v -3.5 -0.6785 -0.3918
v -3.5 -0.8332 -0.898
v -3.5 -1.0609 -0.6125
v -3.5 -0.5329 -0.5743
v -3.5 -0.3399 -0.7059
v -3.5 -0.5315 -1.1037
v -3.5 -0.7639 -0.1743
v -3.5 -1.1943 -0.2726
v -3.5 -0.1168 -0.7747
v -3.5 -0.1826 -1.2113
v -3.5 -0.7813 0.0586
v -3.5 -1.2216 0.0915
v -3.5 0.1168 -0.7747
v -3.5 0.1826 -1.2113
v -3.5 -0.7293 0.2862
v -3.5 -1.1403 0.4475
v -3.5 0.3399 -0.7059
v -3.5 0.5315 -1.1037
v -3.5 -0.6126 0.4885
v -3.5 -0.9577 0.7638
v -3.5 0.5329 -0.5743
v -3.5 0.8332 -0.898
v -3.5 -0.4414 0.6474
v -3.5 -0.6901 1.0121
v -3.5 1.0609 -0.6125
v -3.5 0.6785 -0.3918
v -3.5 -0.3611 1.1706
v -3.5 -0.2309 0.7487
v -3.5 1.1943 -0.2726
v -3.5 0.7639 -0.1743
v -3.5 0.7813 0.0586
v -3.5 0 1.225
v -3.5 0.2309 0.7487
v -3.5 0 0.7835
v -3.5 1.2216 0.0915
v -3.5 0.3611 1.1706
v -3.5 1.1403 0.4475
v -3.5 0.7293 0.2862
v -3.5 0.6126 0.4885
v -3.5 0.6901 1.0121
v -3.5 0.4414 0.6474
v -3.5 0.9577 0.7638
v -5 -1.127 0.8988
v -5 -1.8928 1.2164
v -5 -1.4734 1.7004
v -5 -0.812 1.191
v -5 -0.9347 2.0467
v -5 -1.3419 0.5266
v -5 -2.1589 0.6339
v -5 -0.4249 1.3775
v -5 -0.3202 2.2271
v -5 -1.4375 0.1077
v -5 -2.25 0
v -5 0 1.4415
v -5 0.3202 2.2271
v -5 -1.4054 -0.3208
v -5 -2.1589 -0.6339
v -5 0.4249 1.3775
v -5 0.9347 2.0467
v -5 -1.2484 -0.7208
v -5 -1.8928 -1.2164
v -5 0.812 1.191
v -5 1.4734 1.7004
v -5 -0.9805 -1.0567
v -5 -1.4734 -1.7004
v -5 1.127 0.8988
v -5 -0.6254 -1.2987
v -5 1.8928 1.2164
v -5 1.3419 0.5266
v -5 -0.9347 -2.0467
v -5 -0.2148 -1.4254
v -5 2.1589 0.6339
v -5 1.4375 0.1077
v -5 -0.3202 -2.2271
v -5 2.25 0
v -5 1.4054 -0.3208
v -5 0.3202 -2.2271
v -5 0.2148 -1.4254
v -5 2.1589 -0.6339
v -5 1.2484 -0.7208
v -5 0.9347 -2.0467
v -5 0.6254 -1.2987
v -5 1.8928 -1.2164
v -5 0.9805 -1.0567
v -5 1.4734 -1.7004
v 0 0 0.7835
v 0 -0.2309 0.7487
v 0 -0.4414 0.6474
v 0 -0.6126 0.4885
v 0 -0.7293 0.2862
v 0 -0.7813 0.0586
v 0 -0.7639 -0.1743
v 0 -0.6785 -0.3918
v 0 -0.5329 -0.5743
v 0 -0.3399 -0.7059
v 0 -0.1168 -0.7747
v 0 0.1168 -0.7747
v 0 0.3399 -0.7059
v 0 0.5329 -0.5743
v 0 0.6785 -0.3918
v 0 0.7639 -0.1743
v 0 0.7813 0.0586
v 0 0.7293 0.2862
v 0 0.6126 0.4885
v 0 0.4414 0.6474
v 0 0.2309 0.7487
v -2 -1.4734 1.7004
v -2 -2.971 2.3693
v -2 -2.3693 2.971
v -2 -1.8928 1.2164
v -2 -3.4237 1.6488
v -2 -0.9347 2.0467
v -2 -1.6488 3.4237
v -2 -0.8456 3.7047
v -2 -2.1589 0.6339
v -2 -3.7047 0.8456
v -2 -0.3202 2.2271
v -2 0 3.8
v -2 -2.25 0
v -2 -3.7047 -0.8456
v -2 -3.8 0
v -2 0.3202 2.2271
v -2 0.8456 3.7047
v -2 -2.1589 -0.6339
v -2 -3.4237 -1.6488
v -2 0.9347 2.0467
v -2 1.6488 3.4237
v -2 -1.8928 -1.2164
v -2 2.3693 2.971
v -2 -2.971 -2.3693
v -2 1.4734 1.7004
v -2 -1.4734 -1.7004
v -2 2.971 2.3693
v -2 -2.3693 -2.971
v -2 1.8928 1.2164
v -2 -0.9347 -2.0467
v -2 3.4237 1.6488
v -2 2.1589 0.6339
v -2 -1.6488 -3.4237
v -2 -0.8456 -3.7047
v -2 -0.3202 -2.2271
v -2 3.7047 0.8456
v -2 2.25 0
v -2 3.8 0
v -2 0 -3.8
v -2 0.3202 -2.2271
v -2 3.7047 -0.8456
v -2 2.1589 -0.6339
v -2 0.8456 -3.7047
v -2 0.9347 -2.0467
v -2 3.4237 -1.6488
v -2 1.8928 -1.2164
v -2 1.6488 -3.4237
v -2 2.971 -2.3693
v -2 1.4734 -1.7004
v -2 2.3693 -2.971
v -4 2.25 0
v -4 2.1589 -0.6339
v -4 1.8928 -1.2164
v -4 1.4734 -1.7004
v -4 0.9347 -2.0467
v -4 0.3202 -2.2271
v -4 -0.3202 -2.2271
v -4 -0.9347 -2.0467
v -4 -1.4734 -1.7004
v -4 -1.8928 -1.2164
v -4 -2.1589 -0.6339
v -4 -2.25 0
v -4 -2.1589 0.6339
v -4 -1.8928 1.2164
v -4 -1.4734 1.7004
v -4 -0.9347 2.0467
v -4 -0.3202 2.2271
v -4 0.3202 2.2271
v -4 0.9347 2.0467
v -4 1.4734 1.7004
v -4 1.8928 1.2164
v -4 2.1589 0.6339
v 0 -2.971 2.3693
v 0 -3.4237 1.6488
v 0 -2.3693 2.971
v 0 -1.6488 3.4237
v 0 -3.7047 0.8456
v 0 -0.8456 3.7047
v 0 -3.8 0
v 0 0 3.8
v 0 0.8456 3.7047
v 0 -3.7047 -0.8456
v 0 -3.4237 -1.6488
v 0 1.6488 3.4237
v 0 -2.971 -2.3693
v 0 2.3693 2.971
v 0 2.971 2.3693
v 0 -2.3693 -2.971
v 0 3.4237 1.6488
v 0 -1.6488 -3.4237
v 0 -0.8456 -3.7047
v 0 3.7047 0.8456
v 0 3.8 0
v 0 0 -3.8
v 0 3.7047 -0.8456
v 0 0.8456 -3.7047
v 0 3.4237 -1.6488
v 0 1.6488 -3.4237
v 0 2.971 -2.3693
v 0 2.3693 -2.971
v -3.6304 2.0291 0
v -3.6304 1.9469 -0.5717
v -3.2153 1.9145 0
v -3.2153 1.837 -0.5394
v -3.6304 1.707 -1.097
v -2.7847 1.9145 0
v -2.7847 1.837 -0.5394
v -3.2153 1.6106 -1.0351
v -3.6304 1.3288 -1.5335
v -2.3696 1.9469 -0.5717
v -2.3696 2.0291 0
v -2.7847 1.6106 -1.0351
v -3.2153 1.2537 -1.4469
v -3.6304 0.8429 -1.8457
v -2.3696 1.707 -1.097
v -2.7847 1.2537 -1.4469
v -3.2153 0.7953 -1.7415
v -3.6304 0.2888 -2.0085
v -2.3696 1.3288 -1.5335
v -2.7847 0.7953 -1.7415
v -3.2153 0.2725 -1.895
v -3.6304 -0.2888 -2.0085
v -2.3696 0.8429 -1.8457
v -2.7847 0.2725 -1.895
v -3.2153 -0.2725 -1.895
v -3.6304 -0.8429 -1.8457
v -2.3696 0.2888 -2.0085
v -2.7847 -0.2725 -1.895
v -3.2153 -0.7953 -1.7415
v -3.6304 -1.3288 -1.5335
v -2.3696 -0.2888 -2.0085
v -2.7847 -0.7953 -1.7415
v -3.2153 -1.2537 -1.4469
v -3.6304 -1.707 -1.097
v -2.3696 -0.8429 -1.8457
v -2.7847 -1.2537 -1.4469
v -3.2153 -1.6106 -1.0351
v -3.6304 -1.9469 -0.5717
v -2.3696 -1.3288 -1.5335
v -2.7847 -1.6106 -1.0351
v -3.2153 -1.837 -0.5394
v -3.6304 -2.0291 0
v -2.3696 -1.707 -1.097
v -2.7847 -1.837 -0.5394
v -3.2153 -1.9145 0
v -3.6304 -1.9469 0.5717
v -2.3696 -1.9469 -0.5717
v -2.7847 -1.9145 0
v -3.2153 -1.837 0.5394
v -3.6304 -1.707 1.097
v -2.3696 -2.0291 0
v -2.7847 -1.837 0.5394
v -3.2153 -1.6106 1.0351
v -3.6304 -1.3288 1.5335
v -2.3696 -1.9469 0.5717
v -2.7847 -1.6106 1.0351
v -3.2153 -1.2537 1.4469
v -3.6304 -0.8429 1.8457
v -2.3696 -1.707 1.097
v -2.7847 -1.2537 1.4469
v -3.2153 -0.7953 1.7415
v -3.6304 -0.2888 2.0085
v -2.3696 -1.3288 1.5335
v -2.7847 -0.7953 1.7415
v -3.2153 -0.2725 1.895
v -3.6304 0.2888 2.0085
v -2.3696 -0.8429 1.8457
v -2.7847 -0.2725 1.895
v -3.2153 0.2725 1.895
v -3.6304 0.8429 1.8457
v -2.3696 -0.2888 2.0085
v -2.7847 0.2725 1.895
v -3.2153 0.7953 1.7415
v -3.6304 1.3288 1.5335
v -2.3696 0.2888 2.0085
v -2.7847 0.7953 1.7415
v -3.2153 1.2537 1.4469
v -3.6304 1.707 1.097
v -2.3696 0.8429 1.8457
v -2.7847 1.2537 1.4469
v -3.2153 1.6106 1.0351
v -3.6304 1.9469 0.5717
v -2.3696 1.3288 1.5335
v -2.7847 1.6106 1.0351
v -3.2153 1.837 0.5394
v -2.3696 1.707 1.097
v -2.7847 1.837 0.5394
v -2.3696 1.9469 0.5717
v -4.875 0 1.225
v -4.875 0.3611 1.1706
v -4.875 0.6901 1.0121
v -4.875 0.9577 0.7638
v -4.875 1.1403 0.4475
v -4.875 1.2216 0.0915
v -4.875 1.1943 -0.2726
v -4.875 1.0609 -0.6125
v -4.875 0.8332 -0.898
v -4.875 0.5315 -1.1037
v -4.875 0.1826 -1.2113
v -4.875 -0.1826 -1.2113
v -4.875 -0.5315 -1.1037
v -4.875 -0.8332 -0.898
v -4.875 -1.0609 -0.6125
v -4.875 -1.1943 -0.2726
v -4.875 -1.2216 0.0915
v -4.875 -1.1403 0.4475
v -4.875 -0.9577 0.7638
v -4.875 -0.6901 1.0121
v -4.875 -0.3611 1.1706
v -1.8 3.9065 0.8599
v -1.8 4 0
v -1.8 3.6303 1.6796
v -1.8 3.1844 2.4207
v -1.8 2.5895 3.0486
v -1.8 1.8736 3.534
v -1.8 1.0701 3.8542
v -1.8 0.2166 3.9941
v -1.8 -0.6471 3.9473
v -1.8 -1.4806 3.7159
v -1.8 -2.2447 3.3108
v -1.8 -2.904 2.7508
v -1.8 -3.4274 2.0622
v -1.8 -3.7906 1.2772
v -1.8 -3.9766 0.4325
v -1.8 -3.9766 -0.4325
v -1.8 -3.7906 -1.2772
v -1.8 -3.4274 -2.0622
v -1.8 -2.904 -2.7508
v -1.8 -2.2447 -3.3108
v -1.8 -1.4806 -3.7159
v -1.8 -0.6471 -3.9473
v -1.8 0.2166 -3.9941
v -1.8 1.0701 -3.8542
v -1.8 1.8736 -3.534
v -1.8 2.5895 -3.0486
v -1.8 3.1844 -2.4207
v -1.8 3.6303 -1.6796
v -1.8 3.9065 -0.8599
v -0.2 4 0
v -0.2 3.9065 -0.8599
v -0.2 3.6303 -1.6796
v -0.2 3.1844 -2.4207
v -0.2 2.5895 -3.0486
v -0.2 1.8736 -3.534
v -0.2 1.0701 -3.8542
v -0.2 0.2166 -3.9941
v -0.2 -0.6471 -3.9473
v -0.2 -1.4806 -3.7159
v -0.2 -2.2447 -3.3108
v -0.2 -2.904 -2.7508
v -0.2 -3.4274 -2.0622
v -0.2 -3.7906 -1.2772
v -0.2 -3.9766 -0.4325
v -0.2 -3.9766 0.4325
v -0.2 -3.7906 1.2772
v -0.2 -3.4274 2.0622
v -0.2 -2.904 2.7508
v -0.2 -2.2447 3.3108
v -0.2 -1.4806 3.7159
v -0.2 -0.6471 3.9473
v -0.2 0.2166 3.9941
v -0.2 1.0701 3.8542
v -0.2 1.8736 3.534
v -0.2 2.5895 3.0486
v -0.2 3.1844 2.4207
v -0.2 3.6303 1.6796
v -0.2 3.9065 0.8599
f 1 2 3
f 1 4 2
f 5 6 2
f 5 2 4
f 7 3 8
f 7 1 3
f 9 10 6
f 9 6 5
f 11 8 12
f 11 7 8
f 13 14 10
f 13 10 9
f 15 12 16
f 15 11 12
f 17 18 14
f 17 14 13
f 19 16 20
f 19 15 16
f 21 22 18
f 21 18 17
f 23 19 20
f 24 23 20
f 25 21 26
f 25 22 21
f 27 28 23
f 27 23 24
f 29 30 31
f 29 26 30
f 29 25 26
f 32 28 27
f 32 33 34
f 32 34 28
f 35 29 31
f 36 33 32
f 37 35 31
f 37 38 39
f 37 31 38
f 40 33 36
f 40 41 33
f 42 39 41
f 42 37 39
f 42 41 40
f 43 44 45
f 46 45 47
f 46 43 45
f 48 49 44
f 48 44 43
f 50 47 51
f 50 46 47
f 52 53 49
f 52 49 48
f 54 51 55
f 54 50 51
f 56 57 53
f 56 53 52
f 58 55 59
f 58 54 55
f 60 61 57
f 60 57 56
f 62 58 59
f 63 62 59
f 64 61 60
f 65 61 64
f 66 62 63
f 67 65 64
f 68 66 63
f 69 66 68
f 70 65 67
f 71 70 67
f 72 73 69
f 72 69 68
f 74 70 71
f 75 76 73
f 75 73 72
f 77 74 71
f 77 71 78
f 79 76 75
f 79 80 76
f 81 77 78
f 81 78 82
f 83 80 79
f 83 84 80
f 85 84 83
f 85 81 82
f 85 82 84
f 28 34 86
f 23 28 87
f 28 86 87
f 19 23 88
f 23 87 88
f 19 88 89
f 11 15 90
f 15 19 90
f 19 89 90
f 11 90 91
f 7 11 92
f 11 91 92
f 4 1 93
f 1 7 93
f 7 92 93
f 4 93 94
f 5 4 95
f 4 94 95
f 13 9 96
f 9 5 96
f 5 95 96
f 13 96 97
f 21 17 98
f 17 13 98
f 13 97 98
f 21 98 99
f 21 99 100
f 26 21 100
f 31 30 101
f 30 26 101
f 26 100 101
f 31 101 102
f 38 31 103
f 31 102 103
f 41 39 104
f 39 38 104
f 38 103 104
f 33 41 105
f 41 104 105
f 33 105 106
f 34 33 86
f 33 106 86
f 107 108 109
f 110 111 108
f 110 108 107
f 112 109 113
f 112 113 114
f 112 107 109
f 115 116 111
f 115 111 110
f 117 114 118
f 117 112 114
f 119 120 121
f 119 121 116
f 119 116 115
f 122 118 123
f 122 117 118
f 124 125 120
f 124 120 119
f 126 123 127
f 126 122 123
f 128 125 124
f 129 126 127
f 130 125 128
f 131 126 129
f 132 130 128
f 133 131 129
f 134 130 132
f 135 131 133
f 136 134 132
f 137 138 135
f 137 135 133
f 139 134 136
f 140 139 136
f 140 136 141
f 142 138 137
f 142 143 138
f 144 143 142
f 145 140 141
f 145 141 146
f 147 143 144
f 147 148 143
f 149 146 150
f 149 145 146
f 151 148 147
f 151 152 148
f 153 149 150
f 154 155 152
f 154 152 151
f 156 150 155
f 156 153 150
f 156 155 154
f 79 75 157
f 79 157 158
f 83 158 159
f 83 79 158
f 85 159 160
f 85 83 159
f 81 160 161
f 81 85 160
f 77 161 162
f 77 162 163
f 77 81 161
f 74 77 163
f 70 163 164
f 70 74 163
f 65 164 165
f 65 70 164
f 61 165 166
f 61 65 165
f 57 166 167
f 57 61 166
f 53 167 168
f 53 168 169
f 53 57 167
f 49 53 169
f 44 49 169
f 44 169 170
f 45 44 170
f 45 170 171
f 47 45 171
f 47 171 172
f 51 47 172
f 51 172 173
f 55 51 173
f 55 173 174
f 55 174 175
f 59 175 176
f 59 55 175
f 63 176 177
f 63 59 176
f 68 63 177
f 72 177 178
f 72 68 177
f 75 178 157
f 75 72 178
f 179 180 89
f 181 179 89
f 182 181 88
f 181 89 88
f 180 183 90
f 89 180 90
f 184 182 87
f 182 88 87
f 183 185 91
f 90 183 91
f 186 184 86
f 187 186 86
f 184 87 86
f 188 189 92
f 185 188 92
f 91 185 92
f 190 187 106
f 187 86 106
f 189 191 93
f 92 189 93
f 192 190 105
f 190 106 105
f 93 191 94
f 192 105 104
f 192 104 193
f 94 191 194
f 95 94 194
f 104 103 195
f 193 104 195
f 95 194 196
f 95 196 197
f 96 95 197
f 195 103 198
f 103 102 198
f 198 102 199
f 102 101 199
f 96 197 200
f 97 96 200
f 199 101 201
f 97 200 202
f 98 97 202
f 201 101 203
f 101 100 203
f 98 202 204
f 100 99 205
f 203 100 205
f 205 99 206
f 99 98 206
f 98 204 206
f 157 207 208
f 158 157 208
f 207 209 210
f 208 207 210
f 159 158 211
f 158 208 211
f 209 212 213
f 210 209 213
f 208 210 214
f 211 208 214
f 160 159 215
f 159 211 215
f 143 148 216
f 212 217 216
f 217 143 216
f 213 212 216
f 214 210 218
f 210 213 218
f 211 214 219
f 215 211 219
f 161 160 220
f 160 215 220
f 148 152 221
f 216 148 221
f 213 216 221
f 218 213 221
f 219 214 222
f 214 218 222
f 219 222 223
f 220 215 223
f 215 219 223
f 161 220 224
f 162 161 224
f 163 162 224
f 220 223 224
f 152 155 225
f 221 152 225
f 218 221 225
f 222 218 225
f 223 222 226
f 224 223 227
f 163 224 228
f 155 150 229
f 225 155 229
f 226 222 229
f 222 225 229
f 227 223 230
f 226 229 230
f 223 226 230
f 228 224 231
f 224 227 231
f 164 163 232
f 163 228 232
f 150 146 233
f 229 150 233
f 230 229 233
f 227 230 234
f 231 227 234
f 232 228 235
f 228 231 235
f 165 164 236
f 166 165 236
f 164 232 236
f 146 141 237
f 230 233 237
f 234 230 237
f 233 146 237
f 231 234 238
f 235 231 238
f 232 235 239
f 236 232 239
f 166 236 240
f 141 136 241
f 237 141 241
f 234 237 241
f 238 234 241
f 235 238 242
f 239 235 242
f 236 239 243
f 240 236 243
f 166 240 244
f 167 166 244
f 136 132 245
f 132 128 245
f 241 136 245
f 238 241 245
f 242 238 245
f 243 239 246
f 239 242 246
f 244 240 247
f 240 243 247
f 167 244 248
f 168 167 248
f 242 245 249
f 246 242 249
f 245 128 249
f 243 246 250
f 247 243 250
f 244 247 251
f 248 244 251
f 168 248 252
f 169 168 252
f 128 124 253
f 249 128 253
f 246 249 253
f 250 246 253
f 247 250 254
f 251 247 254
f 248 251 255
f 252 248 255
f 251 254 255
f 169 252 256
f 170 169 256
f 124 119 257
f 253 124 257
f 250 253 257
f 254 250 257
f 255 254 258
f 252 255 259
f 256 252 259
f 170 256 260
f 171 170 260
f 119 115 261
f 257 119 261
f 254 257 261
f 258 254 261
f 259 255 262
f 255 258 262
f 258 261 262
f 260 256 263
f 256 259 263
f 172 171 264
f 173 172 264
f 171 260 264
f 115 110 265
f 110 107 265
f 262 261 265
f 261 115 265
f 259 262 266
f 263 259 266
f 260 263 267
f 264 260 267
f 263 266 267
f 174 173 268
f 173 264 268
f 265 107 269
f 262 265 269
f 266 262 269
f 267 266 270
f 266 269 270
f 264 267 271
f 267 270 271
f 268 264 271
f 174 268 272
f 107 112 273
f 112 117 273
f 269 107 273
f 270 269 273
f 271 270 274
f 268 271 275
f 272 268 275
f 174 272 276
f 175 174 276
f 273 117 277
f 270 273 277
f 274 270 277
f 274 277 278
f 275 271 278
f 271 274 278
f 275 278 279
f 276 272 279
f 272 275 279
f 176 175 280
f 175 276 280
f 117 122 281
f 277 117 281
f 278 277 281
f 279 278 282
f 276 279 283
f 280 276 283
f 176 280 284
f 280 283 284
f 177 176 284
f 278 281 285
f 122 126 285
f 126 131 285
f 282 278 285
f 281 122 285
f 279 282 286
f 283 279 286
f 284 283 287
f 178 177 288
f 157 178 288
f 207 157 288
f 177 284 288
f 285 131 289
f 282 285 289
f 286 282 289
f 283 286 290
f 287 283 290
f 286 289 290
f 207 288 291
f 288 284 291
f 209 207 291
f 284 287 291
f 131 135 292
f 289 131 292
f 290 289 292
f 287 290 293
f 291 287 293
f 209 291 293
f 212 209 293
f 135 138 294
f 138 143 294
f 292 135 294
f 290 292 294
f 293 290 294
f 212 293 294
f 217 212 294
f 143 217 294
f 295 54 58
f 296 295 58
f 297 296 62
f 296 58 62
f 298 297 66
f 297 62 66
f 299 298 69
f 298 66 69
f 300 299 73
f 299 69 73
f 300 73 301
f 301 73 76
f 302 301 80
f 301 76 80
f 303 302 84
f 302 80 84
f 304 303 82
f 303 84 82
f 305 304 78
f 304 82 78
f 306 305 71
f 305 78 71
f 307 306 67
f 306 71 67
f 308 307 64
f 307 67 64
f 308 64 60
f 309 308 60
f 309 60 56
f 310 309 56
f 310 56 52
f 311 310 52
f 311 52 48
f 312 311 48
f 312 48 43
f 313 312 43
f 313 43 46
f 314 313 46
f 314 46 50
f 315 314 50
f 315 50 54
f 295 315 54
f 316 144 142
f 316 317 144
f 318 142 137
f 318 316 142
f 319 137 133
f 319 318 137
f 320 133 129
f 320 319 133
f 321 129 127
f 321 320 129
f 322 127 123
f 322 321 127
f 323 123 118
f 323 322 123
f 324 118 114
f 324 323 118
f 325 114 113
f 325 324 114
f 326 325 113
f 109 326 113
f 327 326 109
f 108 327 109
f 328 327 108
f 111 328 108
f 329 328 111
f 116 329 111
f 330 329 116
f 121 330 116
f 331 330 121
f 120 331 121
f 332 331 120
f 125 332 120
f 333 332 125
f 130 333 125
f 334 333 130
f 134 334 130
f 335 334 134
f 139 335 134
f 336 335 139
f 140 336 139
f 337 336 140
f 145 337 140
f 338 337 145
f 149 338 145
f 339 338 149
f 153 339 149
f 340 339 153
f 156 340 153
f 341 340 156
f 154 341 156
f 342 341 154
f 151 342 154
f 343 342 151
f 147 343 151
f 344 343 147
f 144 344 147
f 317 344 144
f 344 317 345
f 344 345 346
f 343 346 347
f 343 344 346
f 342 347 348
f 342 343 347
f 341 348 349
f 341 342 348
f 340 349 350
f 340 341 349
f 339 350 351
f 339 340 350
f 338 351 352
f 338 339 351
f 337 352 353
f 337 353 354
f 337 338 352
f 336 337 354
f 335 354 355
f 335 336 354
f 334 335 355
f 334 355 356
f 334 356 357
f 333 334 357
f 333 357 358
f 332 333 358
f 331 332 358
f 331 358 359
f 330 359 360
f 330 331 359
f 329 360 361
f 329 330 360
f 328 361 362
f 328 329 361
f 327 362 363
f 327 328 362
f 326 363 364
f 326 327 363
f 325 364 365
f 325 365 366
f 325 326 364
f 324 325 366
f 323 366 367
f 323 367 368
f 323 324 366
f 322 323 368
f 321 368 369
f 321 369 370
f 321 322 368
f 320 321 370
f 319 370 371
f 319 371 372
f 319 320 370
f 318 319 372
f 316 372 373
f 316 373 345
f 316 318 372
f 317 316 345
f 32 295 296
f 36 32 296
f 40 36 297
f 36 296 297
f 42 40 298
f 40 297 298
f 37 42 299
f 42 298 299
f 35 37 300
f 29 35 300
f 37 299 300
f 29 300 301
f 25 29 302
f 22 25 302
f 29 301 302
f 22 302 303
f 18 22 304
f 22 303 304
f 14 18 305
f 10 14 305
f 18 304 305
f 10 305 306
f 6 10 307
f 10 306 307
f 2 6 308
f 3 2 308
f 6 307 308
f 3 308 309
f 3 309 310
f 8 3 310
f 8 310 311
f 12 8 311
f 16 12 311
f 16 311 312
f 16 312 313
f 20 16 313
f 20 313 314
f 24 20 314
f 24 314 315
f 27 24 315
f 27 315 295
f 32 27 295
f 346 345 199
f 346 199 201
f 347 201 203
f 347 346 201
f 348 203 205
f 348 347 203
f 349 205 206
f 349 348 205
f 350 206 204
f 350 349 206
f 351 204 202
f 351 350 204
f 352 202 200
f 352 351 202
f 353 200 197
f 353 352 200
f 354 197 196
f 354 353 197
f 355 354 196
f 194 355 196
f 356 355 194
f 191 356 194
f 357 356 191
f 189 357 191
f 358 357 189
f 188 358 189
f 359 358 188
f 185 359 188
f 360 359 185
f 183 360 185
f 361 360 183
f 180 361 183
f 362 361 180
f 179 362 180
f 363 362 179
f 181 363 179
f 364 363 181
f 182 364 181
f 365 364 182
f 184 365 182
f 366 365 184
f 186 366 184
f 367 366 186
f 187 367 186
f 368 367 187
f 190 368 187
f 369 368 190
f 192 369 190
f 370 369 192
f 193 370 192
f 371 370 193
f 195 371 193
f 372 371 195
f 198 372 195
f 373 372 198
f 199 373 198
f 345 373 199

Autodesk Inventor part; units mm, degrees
ref_plane "YZ Plane" through (0, 0, 0) normal (1, 0, 0) x (0, 1, 0)
ref_plane "XZ Plane" through (0, 0, 0) normal (0, 1, 0) x (-1, 0, 0)
sketch "Sketch1" plane through (0, 0, 0) normal (0, 0, 1) x (1, 0, 0)
  line L0 (0, 0) -> (-5, 0)
  line L1 (0, 0) -> (0, 4)
  line L2 (0, 4) -> (-2, 4)
  line L3 (-2, 4) -> (-2, 2.25)
  line L4 (-4, 2.25) -> (-5, 2.25)
  line L5 (-5, 2.25) -> (-5, 0)
  arc A0 (-4, 2.25) -> (-2, 2.25) centre (-3, 3.5036) ccw
  dimension "d0" = 2
  dimension "d1" = 5
  dimension "d2" = 8
  dimension "d3" = 4.5
  dimension "d13" = 3.8
  dimension "d15" = 1
revolve "Body" add sketch "Sketch1" angle 360 about axis through (0, 0, 0) along (-1, 0, 0)
sketch "Sketch2" plane through (-5, 0, 0) normal (-1, 0, 0) x (0, 0, 1)
  circle A0 centre (0, 0) radius 4 projected
  line L0 (0, 0) -> (0, 4) construction
  line L1 (-0.25, 3.9922) -> (0, 3.7422)
  line L2 (0.25, 3.9922) -> (0, 3.7422)
  arc A1 (0.25, 3.9922) -> (-0.25, 3.9922) centre (0, 0) ccw
  circle A2 centre (0, 0) radius 2.25 projected
  dimension "d4" = 90
  dimension "d5" = 0.25
chamfer "Chamfer1" distance 0.2 angle 45 1 edges at (0, -4, 0) measured on face at (0, 0.998, -0.8842)
chamfer "Chamfer2" distance 0.2 angle 45 1 edges at (-2, -4, 0) measured on face at (-2, 3.3779, 0.3191)
extrude "Notch1" [suppressed]
pattern_circular "Notches1" [suppressed]
hole "Thread" at (-5, 0, 0) direction (1, 0, 0) diameter 1.567 end through all thread size "M2x0.4" designation "M2" class "6H" standard "GB Metric profile"
sketch "Sketch4" plane through (-5, 0, 0) normal (-1, 0, 0) x (0, 0, 1)
  circle A0 centre (0, 0) radius 0.7835 projected
  circle A1 centre (0, 0) radius 2.25 projected
  circle A2 centre (0, 0) radius 1.225
  dimension "d42" = 2.45
extrude "Hole1" cut sketch "Sketch4" against normal blind 1.5 contours A2
chamfer "Chamfer3" distance 0.2165 angle 30 1 edges at (-5, 0, -1.225) measured on face at (-5, 1.8836, 0.2287)
ref_plane "Work Plane1" through (6.2586, 0, 0) normal (0, 0, -1) x (-1, 0, 0)
equation "\"d5\" = 0.5 * T"
equation "\"d23\" = PHH"
equation "\"d24\" = FAWI"
equation "\"d38\" = PHH"
equation "\"d25\" = PHH"
equation "\"d26\" = FAWI"
equation "\"d39\" = PHH"
equation "\"d42\" = Da"
equation "\"d43\" = Ta"
equation "\"d10\" = -0.5 * GD1 + 0.5 * NND"
equation "\"d40\" = -0.5 * GD1 + 0.5 * NND"
equation "\"d0\" = KOH1"
equation "\"d1\" = KOH"
equation "\"d2\" = KOD"
equation "\"d3\" = BDM"
equation "\"d13\" = BDMM"
equation "\"d15\" = SLG"
equation "\"FAWI\" = 45deg"
equation "\"T\" = 0.5"
equation "\"NND\" = 2"
equation "\"KOD\" = 8"
equation "\"KOH\" = 5"
equation "\"KOH1\" = 2"
equation "\"BDM\" = 4.5"
equation "\"PHH\" = 0.2"
equation "\"SLG\" = 1"
equation "\"BDMM\" = 3.8"
equation "\"Da\" = 2.45"
equation "\"Ta\" = 1.5"
equation "\"GUL\" = 0.541266 * PTC"
equation "\"RR\" = 1.25"
equation "\"LOTI\" = 1.5"
equation "\"THREADDIA\" = 2"
equation "\"PTC\" = 0.4"
equation "\"GAL\" = 0.541266 * PTC"
equation "\"TOA\" = 30deg"
equation "\"GD1\" = 1.566987"
properties part number "Nut GB 806 M2" material "Steel, Mild"
